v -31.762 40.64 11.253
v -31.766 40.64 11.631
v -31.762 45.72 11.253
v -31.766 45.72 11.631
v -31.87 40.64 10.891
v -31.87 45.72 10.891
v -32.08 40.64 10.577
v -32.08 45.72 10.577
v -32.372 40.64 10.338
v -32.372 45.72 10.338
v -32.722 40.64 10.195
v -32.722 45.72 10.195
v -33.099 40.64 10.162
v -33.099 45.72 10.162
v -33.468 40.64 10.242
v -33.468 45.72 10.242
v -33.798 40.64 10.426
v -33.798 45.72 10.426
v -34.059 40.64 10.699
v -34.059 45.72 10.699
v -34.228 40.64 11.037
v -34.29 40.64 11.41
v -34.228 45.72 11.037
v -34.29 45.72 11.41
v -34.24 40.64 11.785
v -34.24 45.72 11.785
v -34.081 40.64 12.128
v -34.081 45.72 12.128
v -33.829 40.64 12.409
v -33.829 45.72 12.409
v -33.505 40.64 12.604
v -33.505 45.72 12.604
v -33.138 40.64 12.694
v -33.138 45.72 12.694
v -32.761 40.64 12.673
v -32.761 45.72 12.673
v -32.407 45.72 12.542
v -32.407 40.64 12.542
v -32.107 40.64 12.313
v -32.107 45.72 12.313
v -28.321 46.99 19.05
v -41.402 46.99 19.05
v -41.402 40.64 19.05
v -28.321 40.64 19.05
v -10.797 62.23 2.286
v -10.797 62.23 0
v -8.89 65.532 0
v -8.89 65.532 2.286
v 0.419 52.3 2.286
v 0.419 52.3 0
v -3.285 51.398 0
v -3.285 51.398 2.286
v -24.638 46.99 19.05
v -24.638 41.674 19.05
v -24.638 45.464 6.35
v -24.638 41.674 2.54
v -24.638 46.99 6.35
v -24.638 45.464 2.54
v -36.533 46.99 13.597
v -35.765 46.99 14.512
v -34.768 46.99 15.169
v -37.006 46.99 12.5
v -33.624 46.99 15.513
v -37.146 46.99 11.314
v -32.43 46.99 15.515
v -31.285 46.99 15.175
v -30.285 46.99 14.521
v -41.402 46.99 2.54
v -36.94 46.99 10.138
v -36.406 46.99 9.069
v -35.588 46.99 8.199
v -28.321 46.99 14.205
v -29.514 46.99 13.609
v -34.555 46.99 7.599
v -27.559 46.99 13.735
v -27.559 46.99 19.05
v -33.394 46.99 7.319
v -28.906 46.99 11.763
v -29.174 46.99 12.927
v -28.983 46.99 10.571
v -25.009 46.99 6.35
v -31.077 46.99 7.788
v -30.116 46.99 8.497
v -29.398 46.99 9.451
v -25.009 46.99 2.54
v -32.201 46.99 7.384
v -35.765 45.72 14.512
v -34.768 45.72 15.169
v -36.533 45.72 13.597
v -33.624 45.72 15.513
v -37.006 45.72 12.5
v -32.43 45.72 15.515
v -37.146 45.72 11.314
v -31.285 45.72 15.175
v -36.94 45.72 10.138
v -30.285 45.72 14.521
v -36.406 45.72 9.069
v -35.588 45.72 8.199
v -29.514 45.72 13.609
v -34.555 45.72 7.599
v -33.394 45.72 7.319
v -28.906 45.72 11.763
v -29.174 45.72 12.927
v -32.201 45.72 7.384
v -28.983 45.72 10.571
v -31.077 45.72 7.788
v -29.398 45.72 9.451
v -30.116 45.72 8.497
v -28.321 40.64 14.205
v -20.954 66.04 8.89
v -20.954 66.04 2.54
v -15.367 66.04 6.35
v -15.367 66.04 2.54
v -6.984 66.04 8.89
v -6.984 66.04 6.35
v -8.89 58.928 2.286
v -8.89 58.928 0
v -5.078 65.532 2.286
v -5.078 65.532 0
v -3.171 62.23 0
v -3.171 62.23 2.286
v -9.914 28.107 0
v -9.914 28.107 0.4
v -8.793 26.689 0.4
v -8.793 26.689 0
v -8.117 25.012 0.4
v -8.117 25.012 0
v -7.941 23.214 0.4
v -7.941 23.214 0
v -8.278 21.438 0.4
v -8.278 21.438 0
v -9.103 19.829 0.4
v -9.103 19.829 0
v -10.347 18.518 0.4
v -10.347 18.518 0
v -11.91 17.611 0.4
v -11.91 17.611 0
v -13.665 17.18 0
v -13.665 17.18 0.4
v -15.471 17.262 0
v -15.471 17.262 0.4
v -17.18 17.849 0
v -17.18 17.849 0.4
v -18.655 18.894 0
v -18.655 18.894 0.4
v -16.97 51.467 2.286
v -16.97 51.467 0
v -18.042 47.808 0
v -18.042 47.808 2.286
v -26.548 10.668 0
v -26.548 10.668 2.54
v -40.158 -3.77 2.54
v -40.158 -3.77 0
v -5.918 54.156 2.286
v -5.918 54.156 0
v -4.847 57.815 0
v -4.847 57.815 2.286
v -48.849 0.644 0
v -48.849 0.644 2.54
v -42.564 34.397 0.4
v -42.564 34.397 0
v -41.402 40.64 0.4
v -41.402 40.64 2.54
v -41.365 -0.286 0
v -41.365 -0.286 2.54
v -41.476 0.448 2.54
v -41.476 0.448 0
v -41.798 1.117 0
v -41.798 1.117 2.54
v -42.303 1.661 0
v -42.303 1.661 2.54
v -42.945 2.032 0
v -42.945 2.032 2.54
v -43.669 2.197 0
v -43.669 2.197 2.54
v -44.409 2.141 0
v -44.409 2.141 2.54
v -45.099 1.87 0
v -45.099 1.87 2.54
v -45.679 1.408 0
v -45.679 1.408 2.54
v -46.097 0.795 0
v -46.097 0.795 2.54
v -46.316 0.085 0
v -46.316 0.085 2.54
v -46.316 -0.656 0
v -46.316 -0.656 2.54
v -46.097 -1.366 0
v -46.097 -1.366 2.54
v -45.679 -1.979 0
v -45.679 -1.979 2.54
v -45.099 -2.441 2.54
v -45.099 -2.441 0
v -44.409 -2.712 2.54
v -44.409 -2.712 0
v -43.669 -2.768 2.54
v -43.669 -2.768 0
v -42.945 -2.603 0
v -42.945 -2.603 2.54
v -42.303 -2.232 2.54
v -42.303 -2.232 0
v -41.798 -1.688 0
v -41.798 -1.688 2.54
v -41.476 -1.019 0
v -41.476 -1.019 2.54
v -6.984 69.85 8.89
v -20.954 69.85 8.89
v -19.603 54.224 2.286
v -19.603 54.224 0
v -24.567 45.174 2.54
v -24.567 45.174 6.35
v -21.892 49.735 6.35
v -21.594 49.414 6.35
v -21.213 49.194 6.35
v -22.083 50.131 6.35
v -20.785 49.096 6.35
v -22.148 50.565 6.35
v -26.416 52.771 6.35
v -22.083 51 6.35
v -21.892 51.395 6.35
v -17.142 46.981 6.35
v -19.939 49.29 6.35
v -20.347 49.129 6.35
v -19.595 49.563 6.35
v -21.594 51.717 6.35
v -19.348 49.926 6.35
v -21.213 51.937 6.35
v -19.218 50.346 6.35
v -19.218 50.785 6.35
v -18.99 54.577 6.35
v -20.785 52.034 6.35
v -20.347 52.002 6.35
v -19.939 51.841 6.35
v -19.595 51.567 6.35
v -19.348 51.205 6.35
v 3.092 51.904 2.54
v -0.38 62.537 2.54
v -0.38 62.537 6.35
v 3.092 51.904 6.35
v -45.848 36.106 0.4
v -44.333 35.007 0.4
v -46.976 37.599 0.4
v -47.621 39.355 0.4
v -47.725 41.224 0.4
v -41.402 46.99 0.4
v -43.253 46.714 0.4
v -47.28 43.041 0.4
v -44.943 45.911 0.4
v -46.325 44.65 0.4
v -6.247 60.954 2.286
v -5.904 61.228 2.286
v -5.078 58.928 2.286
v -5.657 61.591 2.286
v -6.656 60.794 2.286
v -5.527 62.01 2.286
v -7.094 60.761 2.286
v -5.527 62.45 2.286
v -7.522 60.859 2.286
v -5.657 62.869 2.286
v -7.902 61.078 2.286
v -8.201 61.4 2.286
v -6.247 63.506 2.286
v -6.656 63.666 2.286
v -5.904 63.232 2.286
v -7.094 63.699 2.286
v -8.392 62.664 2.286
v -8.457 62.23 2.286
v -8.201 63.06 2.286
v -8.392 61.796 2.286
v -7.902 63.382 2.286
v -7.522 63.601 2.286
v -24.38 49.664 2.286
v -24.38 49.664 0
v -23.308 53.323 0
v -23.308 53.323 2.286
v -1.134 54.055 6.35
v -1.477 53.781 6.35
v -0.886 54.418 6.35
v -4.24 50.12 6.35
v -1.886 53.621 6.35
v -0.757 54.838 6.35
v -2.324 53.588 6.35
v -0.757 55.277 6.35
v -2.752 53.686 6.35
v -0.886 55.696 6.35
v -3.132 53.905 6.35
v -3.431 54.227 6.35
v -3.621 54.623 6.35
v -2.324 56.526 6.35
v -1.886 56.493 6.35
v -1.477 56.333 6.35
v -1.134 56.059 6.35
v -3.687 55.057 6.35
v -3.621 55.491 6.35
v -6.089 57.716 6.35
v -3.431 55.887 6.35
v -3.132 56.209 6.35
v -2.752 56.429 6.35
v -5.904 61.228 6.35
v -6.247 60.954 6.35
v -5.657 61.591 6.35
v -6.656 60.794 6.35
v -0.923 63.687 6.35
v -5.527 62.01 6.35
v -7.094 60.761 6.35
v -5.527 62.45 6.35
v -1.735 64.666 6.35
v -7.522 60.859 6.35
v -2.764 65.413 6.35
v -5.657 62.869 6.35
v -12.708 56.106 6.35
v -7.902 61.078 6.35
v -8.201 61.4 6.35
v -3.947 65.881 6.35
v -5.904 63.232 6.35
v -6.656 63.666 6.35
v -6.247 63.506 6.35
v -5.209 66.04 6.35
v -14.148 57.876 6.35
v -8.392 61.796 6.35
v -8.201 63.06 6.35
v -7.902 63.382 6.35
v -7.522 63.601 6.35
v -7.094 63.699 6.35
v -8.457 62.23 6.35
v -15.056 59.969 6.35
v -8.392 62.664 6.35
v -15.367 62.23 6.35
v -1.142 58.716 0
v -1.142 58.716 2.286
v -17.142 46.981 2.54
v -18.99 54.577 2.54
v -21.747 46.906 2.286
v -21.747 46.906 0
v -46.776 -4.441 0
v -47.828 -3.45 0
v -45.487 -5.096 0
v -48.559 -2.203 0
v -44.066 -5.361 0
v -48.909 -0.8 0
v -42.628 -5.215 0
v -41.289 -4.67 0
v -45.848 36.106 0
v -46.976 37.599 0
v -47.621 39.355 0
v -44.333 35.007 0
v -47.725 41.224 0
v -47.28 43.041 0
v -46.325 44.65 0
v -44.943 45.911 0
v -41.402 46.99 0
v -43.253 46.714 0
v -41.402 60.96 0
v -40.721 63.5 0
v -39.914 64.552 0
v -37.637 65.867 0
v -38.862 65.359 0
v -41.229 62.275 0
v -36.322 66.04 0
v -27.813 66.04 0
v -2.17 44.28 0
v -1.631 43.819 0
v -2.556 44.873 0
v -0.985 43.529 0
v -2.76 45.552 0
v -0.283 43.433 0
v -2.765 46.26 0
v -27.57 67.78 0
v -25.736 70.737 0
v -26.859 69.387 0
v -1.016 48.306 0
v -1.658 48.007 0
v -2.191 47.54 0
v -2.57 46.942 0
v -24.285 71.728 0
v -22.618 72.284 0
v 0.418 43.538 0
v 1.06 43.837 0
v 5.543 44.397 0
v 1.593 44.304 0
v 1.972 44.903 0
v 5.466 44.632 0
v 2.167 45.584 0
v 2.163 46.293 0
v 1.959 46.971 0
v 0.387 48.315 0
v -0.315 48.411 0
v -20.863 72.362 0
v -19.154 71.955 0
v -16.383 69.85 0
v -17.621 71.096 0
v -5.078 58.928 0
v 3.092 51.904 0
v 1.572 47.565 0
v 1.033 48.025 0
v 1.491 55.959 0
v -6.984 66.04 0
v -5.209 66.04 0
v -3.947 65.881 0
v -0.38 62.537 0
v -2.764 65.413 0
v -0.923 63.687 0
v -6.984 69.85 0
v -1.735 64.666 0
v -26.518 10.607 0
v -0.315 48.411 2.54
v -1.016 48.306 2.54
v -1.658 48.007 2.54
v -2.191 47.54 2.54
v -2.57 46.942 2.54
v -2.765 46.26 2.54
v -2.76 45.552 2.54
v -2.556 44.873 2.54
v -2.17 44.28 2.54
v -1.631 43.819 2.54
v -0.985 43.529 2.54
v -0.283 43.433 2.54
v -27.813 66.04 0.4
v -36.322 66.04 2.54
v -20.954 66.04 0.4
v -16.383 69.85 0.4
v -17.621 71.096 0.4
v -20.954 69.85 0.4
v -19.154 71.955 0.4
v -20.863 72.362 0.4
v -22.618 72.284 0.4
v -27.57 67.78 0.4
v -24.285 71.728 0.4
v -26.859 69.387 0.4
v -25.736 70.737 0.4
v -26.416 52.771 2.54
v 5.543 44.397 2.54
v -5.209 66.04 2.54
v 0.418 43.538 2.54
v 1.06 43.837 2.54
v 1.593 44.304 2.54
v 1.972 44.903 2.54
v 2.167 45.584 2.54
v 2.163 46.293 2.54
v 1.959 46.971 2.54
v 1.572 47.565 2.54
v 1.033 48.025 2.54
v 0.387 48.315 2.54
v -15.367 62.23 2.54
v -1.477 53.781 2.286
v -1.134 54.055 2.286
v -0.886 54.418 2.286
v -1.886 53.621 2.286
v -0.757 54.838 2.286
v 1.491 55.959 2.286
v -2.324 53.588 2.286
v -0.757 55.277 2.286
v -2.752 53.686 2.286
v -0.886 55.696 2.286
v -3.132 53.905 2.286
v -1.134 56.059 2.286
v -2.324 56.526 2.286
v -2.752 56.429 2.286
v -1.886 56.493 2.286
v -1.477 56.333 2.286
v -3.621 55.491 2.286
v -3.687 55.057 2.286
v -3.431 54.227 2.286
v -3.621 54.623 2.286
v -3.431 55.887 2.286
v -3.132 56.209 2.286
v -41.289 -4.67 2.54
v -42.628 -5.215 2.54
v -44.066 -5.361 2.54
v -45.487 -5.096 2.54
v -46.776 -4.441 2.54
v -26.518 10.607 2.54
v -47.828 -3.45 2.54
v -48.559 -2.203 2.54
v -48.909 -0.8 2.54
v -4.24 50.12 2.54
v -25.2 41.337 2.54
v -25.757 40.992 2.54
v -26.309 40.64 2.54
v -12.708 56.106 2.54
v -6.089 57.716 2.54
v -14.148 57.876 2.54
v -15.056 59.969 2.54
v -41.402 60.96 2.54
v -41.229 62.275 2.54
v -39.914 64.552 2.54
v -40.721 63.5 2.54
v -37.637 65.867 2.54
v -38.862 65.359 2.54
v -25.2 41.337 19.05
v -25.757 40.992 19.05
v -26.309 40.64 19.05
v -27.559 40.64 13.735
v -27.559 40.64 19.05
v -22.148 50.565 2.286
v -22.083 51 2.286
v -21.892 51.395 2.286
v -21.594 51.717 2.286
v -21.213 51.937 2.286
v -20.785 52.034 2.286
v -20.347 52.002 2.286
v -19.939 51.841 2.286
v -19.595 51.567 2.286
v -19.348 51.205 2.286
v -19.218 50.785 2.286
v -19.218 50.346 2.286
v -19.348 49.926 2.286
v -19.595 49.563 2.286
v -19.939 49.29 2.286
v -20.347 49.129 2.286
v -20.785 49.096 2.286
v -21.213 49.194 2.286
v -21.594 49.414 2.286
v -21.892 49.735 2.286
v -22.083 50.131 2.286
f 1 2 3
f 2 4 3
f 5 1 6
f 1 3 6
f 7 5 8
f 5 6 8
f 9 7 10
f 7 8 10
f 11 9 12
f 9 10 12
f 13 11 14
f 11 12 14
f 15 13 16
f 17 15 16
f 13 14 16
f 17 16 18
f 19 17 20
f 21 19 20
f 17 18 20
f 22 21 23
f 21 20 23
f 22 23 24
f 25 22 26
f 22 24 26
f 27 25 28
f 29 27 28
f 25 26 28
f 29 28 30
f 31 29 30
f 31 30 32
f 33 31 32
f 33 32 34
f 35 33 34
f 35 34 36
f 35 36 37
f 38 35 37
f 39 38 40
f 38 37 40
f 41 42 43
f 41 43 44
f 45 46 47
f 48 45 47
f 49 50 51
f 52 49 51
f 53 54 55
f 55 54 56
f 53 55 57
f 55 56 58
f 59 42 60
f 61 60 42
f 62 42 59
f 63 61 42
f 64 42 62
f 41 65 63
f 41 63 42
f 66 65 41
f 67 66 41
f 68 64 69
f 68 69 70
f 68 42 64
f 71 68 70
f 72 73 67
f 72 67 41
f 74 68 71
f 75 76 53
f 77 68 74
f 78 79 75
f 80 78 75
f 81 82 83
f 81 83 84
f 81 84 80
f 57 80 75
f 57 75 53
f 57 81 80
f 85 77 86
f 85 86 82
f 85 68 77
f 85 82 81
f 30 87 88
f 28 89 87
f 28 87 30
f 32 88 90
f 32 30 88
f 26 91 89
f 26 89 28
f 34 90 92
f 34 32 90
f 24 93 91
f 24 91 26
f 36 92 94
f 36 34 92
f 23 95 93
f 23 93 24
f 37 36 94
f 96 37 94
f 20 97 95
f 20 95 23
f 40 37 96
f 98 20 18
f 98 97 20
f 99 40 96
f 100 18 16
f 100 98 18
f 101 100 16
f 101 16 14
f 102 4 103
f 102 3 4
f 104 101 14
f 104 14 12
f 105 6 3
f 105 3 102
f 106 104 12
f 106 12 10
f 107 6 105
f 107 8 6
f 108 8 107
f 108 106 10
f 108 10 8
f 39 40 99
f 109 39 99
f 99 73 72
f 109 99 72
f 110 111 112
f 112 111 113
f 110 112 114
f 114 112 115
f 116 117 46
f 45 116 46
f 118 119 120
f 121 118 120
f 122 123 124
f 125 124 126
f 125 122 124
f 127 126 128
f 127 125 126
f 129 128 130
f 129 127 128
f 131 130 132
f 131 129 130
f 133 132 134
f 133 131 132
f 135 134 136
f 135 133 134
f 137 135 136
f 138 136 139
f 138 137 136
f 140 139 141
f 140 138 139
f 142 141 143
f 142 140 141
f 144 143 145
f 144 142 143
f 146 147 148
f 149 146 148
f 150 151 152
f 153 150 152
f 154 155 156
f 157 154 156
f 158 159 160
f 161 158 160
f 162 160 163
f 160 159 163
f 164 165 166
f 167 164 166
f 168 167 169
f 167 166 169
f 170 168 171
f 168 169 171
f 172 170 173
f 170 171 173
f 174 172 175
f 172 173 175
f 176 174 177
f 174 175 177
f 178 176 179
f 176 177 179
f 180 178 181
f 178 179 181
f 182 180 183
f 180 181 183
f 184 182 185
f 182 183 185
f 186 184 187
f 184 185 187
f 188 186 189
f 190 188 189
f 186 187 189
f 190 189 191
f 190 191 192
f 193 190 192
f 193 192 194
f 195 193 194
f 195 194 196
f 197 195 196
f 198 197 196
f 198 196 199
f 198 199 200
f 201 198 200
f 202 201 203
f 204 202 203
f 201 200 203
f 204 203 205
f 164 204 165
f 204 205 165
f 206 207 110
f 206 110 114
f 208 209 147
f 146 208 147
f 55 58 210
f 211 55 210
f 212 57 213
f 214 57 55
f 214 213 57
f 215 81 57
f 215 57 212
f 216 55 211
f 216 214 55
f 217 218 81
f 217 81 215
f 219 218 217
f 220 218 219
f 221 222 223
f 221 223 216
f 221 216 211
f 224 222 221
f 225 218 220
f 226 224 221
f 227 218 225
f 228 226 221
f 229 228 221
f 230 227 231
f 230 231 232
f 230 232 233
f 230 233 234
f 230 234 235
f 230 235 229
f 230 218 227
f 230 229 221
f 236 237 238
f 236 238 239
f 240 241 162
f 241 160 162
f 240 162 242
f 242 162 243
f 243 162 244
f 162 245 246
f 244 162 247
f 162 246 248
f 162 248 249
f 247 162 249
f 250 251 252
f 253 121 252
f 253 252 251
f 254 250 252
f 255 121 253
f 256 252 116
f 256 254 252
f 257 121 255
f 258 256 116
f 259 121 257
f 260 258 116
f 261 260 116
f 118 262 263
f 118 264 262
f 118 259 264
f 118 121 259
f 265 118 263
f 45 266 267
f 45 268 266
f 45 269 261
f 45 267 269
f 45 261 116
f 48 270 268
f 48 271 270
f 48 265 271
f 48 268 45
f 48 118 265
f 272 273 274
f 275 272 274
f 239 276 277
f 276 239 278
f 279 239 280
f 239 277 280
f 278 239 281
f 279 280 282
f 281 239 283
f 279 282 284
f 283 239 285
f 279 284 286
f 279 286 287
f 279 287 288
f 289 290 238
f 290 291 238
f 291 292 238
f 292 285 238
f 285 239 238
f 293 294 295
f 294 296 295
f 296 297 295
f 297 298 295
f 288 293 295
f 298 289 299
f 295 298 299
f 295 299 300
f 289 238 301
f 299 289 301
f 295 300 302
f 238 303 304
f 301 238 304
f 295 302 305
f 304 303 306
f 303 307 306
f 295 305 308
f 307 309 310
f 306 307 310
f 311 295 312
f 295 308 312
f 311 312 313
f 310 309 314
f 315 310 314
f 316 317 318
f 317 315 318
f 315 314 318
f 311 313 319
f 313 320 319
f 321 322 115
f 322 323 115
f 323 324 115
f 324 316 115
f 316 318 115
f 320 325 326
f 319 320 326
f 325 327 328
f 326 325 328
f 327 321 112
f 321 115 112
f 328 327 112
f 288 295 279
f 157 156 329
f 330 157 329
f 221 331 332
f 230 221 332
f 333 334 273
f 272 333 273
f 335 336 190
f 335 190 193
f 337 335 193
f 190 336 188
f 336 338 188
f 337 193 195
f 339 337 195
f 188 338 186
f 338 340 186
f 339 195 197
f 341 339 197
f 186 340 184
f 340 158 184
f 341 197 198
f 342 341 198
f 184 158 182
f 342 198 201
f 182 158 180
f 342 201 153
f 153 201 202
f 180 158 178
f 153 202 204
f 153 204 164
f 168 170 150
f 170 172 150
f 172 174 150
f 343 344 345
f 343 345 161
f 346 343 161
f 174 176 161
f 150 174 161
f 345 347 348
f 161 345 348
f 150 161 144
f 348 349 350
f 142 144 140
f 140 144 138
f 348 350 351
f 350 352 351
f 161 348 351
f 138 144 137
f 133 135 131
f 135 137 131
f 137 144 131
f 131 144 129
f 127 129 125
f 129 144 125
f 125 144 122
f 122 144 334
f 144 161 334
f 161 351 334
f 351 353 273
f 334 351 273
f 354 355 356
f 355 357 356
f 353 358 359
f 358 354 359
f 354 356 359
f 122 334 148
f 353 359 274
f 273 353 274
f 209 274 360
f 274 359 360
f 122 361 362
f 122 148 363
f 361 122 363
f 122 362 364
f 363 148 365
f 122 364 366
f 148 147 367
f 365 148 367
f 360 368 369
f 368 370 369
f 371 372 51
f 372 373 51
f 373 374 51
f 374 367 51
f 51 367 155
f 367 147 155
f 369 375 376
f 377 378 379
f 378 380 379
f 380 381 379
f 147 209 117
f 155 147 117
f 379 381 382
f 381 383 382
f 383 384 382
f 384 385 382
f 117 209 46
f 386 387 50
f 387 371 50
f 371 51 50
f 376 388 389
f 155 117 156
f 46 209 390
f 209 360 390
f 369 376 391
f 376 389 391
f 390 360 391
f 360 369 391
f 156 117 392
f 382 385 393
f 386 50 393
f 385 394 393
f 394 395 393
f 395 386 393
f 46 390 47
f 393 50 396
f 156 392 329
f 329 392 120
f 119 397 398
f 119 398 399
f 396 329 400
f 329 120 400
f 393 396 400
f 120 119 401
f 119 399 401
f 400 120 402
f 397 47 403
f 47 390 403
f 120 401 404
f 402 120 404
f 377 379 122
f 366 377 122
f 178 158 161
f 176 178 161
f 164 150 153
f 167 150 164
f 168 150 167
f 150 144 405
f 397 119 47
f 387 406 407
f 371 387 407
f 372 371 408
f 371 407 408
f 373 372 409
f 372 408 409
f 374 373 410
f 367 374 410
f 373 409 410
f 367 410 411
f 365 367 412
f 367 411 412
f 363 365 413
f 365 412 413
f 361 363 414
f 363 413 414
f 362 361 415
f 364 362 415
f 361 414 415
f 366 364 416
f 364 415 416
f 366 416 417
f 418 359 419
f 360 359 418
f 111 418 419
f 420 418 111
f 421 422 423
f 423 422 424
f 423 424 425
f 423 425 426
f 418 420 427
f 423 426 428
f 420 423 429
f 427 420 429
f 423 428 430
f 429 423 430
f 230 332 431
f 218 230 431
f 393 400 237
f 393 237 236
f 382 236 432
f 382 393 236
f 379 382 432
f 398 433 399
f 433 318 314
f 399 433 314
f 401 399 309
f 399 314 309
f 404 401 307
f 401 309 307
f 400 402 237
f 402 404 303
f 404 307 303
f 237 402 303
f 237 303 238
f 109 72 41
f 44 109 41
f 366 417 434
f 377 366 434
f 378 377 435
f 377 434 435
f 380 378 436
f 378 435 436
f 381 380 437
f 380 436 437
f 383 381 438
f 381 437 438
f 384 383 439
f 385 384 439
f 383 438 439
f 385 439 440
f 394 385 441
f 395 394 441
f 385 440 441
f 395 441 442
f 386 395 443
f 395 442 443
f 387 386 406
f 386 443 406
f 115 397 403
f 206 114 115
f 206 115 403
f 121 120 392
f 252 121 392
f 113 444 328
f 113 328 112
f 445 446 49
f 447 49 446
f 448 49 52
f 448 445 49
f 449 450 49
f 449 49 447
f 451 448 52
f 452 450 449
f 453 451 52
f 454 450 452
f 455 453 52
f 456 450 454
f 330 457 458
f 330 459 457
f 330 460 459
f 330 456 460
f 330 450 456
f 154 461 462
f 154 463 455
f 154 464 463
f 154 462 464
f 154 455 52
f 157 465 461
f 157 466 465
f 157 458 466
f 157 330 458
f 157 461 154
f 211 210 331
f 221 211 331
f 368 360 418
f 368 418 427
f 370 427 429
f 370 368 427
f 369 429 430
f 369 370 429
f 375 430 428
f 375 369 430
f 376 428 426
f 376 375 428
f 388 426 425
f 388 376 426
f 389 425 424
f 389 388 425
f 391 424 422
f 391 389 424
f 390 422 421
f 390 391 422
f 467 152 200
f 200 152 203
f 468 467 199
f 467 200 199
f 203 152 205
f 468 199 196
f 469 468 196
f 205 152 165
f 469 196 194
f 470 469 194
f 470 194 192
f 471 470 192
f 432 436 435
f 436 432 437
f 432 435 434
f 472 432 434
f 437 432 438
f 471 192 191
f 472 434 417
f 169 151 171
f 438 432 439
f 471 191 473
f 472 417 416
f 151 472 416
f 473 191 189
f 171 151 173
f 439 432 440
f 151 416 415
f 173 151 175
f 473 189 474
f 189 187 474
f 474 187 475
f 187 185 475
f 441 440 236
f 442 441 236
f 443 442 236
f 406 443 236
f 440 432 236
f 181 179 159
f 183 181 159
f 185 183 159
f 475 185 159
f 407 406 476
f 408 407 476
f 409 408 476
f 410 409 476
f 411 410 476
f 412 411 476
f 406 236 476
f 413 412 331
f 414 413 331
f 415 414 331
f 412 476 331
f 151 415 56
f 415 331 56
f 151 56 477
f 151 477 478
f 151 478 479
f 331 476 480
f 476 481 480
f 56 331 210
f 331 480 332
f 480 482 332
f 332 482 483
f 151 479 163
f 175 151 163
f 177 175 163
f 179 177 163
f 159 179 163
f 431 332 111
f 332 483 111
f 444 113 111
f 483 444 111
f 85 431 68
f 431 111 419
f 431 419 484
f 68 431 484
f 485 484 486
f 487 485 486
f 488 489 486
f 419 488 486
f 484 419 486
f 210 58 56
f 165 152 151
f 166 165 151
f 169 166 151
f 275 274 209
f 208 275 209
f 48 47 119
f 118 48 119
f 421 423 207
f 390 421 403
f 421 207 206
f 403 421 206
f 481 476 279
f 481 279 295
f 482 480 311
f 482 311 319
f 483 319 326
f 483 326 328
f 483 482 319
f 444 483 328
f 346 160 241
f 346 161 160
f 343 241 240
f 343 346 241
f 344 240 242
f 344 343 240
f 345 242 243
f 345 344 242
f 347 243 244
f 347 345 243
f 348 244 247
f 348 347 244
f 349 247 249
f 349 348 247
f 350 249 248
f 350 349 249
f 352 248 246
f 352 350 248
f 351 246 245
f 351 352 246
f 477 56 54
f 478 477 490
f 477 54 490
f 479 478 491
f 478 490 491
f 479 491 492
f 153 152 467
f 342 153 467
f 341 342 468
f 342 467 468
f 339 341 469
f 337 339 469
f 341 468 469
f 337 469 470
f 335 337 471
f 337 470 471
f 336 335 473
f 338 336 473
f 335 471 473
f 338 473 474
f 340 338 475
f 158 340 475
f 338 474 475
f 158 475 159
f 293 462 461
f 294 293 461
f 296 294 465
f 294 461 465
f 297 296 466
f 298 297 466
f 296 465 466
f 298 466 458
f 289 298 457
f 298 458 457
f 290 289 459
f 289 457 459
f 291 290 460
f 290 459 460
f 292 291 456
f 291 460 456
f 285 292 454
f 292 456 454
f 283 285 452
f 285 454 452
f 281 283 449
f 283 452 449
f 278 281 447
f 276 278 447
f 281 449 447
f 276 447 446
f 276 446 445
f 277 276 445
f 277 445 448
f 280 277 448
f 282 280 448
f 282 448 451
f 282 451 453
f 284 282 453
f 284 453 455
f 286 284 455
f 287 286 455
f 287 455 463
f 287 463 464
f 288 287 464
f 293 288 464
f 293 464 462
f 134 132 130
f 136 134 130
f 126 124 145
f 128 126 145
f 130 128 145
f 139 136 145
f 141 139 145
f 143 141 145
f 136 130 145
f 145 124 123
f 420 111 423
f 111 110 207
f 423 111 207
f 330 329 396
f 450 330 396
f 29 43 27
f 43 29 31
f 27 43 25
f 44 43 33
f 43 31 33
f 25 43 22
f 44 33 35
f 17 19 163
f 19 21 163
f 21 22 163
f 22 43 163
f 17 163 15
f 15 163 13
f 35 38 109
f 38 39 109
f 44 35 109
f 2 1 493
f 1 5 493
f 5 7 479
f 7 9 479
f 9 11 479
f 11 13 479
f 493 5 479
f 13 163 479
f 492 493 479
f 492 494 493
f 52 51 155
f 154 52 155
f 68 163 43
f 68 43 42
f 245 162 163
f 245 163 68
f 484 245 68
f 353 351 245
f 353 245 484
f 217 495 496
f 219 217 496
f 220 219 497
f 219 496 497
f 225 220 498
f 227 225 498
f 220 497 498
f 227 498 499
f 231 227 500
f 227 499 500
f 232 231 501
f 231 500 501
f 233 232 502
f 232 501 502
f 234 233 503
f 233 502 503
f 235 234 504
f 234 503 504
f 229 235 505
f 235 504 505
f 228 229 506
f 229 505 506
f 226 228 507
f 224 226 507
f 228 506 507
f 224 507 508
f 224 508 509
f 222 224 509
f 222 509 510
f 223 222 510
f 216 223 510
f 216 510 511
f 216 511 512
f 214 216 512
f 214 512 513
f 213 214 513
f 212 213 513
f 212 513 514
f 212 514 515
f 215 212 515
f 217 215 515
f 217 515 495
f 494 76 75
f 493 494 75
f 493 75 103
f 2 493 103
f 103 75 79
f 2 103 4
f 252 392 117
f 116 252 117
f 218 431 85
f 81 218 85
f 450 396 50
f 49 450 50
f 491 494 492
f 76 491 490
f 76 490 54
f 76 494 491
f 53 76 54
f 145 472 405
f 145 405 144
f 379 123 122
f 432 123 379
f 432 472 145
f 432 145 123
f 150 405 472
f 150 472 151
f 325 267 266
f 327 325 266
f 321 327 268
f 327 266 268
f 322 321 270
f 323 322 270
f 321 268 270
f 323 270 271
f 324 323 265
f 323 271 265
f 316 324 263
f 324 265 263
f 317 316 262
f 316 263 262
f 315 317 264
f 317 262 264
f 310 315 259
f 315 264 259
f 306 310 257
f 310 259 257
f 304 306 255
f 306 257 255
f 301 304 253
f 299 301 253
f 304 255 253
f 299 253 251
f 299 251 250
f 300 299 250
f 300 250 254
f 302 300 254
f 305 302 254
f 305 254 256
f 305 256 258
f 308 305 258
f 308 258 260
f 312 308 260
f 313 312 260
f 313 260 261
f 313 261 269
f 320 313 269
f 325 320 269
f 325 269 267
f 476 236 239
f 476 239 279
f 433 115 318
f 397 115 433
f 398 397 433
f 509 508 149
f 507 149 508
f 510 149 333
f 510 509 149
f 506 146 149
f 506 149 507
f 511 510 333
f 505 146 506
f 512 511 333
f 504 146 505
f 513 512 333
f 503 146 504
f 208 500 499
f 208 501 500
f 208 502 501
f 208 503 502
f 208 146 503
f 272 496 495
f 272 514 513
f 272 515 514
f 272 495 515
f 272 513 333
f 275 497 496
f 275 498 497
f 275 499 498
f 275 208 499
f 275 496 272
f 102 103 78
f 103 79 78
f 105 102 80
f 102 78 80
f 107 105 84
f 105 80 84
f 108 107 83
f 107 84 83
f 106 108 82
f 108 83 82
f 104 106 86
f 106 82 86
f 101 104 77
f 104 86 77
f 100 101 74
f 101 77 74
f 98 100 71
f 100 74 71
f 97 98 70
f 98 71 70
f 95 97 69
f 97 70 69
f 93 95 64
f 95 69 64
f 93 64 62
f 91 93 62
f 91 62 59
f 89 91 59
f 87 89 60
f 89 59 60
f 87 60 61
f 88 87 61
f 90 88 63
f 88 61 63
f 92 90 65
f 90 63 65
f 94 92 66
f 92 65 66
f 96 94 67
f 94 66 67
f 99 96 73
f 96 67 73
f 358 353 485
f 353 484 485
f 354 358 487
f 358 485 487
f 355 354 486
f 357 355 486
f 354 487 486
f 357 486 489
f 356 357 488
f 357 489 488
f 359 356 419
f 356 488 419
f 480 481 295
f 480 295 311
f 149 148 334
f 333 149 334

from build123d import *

# Parameters (mm, degrees)
SKETCH2_R                = 3.81
BOSS_EXTRUDE1_DEPTH      = 2.54
SKETCH5_W                = 16.764
SKETCH5_H                = 6.35
BOSS_EXTRUDE2_DEPTH      = 16.51
SKETCH6_R                = 4.1275
CUT_EXTRUDE2_DEPTH       = 1.27
SKETCH7_R                = 1.27
CUT_EXTRUDE3_DEPTH       = 65.77
CUT_EXTRUDE4_DEPTH       = 2.286
BOSS_EXTRUDE3_DEPTH      = 3.81
F_4_CLEARANCE_HOLE1_D    = 2.9464
SKETCH14_W               = 13.97
SKETCH14_H               = 3.81
BOSS_EXTRUDE6_DEPTH      = 6.35
BOSS_EXTRUDE6_DEPTH_BACK = 2.54
FILLET1_R                = 5.08
CUT_EXTRUDE5_DEPTH       = 17.51
CUT_EXTRUDE5_DEPTH_BACK  = 3.54
SKETCH19_R               = 2.4892
BOSS_EXTRUDE8_DEPTH      = 2.54
CUT_EXTRUDE8_DEPTH       = 2.54
CUT_EXTRUDE9_DEPTH       = 53.355501773
SKETCH13_R               = 6.35
PRINT_TABS_DEPTH         = 0.4


with BuildPart() as part:
    # Sketch2 → Boss-Extrude1 (new body)
    with BuildSketch(Plane.XY):
        with BuildLine():
            Line((-17.068825413, -8.459178389), (-41.402, 40.64))
            Line((-41.402, 40.64), (-41.402, 66.04))
            Line((-41.402, 66.04), (-1.524, 66.04))
            Line((-1.524, 66.04), (18.109053667, 5.913093546))
            ThreePointArc((18.109053667, 5.913093546), (7.204933647, -17.634949139), (-17.068825413, -8.459178389))
        make_face()
        Circle(SKETCH2_R, mode=Mode.SUBTRACT)
    extrude(amount=BOSS_EXTRUDE1_DEPTH)

    # Sketch5 → Boss-Extrude2 (add)
    with BuildSketch(Plane.XY.offset(2.54)):
        with Locations((-33.02, 43.815)):
            Rectangle(SKETCH5_W, SKETCH5_H)
    extrude(amount=BOSS_EXTRUDE2_DEPTH)

    # Sketch6 → Cut-Extrude2 (cut)
    with BuildSketch(Plane(origin=(0, 46.99, 0), x_dir=(1, 0, 0), z_dir=(0, 1, 0))):
        with Locations((-33.02, -11.43)):
            Circle(SKETCH6_R)
    extrude(amount=-CUT_EXTRUDE2_DEPTH, mode=Mode.SUBTRACT)

    # Sketch7 → Cut-Extrude3 (cut, through all)
    with BuildSketch(Plane(origin=(0, 45.72, 0), x_dir=(1, 0, 0), z_dir=(0, 1, 0))):
        with Locations((-33.02, -11.43)):
            Circle(SKETCH7_R)
    extrude(amount=-CUT_EXTRUDE3_DEPTH, mode=Mode.SUBTRACT)

    # Sketch9 → Cut-Extrude4 (cut)
    with BuildSketch(Plane(origin=(0, 0, 0), x_dir=(-1, 0, 0), z_dir=(0, 0, -1))):
        Polygon((3.171122265, 62.23), (5.077532854, 58.928), (8.890354032, 58.928), (10.796764621, 62.23), (8.890354032, 65.532), (5.077532854, 65.532), align=None)
        Polygon((24.379877895, 49.663956202), (23.308143816, 53.323053276), (19.603405755, 54.224452874), (16.970401774, 51.466755398), (18.042135853, 47.807658324), (21.746873914, 46.906258726), align=None)
        Polygon((5.918476139, 54.15579827), (4.846742059, 57.814895344), (1.142003999, 58.716294942), (-1.490999983, 55.958597466), (-0.419265903, 52.299500392), (3.285472157, 51.398100794), align=None)
    extrude(amount=-CUT_EXTRUDE4_DEPTH, mode=Mode.SUBTRACT)

    # Sketch8 → Boss-Extrude3 (add)
    with BuildSketch(Plane.XY.offset(2.54)):
        with BuildLine():
            Line((-15.367, 66.04), (-6.983943443, 66.04))
            Line((-6.983943443, 66.04), (-1.524, 66.04))
            Line((-1.524, 66.04), (3.09175139, 51.904101595))
            Line((3.09175139, 51.904101595), (-4.240438106, 50.120107003))
            Line((-4.240438106, 50.120107003), (-6.088713216, 57.716488409))
            Line((-6.088713216, 57.716488409), (-12.708473154, 56.10583501))
            ThreePointArc((-12.708473154, 56.10583501), (-14.673699407, 58.891843255), (-15.367, 62.23))
            Line((-15.367, 62.23), (-15.367, 66.04))
        make_face()
        Polygon((-17.142042414, 46.981018422), (-18.990317524, 54.577399829), (-26.415687706, 52.770733449), (-24.567412596, 45.174352043), align=None)
    extrude(amount=BOSS_EXTRUDE3_DEPTH)

    # #4 Clearance Hole1 (through all)
    with Locations(Plane.XY.offset(6.35)):
        with Locations((-6.983943443, 62.23), (-20.675139834, 50.5653558), (-2.213738078, 55.057197868)):
            Hole(F_4_CLEARANCE_HOLE1_D / 2)

    # Sketch14 → Boss-Extrude6 (add, two sides)
    with BuildSketch(Plane.XY.offset(2.54)) as boss_extrude6_sk:
        with Locations((-13.968943443, 67.945)):
            Rectangle(SKETCH14_W, SKETCH14_H)
    extrude(amount=BOSS_EXTRUDE6_DEPTH)
    extrude(boss_extrude6_sk.sketch, amount=-BOSS_EXTRUDE6_DEPTH_BACK)

    # Fillet1
    fillet1_edges = [part.edges().sort_by_distance(p)[0] for p in [
        (-1.524, 66.04, 3.175),
        (-41.402, 66.04, 1.27),
    ]]
    fillet(fillet1_edges, radius=FILLET1_R)

    # Sketch15 → Cut-Extrude5 (cut, two sides)
    with BuildSketch(Plane.XY.offset(2.54)) as cut_extrude5_sk:
        with BuildLine():
            ThreePointArc((-0.315167053, 48.411374113), (-18.310138041, 44.816284079), (-33.674369734, 34.782140486))
            ThreePointArc((-33.674369734, 34.782140486), (-33.731327517, 31.262340905), (-30.211527936, 31.205383122))
            ThreePointArc((-30.211527936, 31.205383122), (-16.427248714, 40.207684038), (-0.28275743, 43.433079608))
            ThreePointArc((-0.28275743, 43.433079608), (2.190185011, 45.938431672), (-0.315167053, 48.411374113))
        make_face()
    extrude(amount=CUT_EXTRUDE5_DEPTH, mode=Mode.SUBTRACT)
    extrude(cut_extrude5_sk.sketch, amount=-CUT_EXTRUDE5_DEPTH_BACK, mode=Mode.SUBTRACT)

    # Sketch19 → Boss-Extrude8 (add, through all)
    with BuildSketch(Plane.XY.offset(2.54)):
        with BuildLine():
            Line((5.466200245, 44.632269783), (-40.158007355, -3.769954845))
            ThreePointArc((-40.158007355, -3.769954845), (-46.15516131, -4.814733016), (-48.848797168, 0.64436424))
            Line((-48.848797168, 0.64436424), (-41.402, 40.64))
            Line((-41.402, 40.64), (3.09175139, 51.904101595))
            Line((3.09175139, 51.904101595), (5.466200245, 44.632269783))
        make_face()
        with Locations((-0.298962241, 45.92222686)):
            Circle(SKETCH19_R, mode=Mode.SUBTRACT)
        with Locations((-43.854625645, -0.285501773)):
            Circle(SKETCH19_R, mode=Mode.SUBTRACT)
    extrude(amount=-BOSS_EXTRUDE8_DEPTH)

    # Sketch20 → Cut-Extrude8 (cut)
    with BuildSketch(Plane.XY.offset(2.54)):
        Polygon((-40.158007355, -3.769954845), (10.729493517, 49.863783044), (48.07174347, 14.433588323), (-7.673080914, -44.319607422), align=None)
    extrude(amount=-CUT_EXTRUDE8_DEPTH, mode=Mode.SUBTRACT)

    # Sketch21 → Cut-Extrude9 (cut, through all)
    with BuildSketch(Plane(origin=(0, 46.99, 0), x_dir=(1, 0, 0), z_dir=(0, 1, 0))):
        Polygon((-27.559, -19.05), (-27.559, -13.73452905), (-32.84961162, -11.08922324), (-33.19038838, -11.77077676), (-28.321, -14.20547095), (-28.321, -19.05), align=None)
    extrude(amount=-CUT_EXTRUDE9_DEPTH, mode=Mode.SUBTRACT)

    # Sketch13 → Print Tabs (add)
    with BuildSketch(Plane(origin=(0, 0, 0), x_dir=(-1, 0, 0), z_dir=(0, 0, -1))):
        with Locations((14.284313144, 23.500060577)):
            Circle(SKETCH13_R)
        with Locations((21.463, 66.04)):
            Circle(SKETCH13_R)
        with Locations((41.402, 40.64)):
            Circle(SKETCH13_R)
    extrude(amount=-PRINT_TABS_DEPTH)


solid = part.part
